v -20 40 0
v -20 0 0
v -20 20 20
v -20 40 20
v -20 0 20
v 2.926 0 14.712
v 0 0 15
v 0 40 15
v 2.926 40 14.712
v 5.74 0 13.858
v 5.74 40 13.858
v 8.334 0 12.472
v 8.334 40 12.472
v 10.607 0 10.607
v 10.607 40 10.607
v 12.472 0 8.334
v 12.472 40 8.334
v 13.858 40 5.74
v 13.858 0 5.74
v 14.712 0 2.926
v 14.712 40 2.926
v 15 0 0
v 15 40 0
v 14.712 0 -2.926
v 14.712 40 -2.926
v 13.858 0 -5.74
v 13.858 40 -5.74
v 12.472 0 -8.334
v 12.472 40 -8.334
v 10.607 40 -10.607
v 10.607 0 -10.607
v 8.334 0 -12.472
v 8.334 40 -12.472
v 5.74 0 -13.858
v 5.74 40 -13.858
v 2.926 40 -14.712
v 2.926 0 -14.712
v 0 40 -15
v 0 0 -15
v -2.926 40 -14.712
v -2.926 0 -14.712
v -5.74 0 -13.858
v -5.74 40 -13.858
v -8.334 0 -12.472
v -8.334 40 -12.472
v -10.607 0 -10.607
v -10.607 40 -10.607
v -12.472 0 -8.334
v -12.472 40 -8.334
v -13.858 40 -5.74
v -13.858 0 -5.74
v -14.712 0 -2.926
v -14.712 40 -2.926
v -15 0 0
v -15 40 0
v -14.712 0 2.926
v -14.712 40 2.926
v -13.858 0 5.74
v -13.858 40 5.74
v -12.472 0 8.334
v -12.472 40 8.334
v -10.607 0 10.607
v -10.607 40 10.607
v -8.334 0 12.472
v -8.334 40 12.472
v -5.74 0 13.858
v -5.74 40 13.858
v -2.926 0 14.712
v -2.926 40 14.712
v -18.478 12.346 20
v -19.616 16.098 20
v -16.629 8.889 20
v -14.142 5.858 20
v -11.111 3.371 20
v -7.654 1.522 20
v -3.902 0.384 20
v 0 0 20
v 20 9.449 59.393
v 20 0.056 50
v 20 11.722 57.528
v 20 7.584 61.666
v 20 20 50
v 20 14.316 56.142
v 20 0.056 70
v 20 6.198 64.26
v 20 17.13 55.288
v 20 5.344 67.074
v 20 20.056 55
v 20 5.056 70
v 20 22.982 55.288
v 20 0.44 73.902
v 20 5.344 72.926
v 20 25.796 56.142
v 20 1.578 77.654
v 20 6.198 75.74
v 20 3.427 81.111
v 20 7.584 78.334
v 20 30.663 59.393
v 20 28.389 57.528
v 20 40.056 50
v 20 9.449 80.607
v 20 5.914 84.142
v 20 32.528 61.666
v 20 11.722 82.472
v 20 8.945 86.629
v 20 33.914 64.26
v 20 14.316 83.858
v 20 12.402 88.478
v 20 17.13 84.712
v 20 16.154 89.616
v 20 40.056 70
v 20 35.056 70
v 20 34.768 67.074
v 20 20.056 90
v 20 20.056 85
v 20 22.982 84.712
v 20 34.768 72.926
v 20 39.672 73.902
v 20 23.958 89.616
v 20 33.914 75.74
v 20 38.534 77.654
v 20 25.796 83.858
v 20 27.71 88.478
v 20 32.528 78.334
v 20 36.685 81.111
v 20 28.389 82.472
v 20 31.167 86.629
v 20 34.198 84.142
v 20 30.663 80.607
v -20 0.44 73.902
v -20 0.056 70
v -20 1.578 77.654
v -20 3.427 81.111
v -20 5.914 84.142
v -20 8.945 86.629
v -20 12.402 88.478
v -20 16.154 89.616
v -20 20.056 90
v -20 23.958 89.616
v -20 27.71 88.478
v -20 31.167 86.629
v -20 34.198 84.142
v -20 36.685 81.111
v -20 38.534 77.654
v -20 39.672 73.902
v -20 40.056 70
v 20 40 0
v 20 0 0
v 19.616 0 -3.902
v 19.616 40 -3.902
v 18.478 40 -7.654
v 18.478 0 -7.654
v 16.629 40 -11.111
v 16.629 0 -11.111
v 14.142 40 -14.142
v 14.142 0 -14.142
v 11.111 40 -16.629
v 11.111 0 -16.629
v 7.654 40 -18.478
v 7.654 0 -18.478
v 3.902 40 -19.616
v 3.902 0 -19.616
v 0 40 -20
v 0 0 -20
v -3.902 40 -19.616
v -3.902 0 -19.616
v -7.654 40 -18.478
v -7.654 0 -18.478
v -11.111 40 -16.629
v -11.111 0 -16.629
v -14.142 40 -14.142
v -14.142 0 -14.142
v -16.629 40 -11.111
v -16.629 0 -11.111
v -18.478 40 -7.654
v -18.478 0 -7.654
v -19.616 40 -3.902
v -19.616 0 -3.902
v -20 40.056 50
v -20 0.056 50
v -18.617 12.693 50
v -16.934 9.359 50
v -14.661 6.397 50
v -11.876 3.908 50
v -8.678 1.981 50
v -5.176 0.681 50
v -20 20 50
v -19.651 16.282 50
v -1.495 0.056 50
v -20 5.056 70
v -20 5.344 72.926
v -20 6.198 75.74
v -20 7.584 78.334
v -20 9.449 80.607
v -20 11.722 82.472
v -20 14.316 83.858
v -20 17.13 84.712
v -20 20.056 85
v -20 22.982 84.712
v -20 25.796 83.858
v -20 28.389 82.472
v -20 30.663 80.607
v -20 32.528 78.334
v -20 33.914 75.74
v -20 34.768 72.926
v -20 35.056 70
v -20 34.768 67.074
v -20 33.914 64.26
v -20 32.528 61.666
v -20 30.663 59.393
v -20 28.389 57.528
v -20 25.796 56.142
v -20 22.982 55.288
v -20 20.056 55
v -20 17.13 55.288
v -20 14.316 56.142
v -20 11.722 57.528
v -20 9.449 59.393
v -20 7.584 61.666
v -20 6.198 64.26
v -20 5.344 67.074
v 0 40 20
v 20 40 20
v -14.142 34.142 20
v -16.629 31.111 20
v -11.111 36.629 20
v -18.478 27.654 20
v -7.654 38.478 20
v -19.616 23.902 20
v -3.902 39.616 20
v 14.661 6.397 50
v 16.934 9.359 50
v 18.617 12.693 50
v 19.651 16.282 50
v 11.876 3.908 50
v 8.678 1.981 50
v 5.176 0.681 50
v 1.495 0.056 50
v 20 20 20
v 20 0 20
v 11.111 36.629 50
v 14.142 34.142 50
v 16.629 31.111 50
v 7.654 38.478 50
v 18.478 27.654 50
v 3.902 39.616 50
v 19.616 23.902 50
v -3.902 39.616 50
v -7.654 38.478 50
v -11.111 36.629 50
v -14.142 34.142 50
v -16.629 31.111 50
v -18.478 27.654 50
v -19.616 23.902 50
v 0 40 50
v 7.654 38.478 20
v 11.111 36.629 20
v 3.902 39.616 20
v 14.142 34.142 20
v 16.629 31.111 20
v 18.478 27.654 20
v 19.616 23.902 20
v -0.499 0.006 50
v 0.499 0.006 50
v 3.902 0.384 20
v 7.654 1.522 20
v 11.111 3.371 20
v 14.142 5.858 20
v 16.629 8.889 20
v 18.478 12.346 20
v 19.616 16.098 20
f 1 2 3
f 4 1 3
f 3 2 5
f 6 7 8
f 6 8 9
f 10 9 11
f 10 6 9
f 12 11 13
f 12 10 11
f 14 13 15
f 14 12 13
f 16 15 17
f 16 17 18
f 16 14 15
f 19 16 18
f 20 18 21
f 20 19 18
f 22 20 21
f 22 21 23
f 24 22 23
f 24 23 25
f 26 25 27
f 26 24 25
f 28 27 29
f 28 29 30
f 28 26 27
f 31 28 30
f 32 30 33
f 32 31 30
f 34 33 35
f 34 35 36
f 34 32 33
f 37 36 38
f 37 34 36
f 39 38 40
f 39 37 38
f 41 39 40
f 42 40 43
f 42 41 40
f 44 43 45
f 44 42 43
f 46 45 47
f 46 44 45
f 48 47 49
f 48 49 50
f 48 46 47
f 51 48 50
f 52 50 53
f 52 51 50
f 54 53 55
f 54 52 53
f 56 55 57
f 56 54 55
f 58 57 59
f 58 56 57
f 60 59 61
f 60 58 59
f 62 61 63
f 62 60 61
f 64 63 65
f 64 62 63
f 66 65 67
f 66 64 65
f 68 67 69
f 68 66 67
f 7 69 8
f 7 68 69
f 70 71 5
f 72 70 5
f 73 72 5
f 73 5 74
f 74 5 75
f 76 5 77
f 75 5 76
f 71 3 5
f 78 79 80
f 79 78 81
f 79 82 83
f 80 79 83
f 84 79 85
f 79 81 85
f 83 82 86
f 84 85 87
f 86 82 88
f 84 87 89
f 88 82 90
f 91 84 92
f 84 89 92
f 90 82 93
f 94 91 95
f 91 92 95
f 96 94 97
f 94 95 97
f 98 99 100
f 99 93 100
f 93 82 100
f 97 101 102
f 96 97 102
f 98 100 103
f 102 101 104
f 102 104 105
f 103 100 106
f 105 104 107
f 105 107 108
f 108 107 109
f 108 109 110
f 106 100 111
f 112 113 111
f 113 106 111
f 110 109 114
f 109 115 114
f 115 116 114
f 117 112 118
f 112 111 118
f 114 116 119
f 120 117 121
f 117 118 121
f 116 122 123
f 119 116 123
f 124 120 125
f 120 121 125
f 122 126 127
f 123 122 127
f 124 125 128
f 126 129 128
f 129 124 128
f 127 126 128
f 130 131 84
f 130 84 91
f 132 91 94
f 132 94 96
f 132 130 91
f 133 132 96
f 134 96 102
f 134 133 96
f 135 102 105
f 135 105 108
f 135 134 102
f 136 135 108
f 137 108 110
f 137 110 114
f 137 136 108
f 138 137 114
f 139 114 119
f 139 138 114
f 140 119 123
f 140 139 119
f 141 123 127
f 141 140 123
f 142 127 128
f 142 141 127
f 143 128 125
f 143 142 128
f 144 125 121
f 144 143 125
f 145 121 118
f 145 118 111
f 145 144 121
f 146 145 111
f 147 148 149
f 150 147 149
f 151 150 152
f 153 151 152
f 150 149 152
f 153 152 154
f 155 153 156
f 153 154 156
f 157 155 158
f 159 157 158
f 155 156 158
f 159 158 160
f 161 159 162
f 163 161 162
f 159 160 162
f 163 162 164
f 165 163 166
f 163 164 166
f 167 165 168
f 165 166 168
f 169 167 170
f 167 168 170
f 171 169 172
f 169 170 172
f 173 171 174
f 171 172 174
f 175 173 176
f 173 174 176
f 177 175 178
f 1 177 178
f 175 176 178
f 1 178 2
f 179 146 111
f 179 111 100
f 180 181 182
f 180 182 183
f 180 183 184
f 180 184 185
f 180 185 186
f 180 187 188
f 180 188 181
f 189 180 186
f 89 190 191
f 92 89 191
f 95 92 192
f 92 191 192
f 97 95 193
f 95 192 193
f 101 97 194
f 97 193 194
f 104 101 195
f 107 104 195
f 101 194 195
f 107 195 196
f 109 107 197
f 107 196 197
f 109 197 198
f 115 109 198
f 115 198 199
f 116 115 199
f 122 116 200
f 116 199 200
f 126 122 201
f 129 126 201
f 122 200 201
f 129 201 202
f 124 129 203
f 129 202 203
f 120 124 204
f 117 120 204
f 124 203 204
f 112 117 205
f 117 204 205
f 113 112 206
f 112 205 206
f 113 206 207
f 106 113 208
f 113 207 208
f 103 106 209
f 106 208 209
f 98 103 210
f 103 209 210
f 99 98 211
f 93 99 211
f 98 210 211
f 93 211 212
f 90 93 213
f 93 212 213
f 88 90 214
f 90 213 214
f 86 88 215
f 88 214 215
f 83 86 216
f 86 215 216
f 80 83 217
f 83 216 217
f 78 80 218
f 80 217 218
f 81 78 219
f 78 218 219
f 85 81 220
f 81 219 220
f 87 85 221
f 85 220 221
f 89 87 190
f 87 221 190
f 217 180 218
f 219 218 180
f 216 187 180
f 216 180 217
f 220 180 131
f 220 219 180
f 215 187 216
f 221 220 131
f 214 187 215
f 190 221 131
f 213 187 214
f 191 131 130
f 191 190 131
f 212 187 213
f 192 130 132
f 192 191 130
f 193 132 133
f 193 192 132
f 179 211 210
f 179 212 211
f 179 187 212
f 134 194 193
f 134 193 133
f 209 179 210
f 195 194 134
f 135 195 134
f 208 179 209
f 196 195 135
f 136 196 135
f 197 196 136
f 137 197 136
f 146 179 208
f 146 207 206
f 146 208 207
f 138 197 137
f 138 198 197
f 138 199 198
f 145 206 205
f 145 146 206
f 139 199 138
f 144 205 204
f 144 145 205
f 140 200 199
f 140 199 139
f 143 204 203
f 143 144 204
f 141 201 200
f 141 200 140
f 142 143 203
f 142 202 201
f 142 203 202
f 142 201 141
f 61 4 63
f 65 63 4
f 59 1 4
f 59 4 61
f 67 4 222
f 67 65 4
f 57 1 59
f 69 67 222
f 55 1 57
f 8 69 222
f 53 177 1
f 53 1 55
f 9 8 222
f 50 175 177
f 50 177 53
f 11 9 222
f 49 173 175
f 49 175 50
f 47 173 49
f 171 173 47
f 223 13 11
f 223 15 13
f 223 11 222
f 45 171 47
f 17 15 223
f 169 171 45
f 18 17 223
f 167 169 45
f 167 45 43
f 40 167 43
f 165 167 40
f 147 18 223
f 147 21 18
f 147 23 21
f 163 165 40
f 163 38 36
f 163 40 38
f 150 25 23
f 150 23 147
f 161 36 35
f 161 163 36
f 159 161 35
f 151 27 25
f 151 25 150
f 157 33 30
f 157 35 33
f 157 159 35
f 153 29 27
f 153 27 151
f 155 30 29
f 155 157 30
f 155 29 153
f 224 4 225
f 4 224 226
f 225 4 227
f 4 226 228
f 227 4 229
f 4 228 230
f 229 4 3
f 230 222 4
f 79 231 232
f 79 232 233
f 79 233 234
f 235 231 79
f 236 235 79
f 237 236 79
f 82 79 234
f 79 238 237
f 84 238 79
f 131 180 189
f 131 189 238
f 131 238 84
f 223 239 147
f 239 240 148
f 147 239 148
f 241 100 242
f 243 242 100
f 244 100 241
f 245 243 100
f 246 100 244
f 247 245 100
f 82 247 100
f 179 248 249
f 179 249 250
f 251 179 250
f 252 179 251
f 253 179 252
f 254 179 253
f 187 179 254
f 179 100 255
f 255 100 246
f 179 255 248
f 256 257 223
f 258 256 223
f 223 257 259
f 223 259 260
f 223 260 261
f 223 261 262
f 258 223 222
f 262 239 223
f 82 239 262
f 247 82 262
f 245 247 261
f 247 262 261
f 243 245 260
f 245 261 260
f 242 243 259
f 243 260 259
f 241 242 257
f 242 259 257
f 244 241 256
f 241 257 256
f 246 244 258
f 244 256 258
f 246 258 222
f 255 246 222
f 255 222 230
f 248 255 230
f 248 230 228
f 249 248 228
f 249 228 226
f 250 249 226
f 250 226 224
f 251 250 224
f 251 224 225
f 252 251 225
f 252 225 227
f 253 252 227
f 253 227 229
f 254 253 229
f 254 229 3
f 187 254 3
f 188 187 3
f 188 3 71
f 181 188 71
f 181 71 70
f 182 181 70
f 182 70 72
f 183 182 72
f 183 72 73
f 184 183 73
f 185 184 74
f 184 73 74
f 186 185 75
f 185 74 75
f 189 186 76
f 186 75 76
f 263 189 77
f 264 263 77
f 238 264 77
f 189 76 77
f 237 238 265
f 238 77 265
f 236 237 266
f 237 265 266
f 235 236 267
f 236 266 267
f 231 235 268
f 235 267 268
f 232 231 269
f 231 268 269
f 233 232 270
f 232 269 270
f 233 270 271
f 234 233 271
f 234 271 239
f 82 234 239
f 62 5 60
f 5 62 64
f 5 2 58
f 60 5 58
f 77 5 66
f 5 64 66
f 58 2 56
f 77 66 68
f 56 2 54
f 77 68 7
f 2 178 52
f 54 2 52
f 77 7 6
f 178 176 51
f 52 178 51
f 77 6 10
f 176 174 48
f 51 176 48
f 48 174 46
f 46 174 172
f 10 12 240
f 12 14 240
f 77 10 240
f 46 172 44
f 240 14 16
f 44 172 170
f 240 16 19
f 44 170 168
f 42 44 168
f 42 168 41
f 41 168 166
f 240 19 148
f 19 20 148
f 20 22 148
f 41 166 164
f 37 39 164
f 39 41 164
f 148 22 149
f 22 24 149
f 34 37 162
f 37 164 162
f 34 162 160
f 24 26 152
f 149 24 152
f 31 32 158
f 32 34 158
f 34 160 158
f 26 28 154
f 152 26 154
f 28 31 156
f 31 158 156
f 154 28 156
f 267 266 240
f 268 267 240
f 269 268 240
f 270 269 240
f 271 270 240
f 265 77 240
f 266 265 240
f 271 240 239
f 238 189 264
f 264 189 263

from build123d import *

# Parameters (mm, degrees)
SKETCH1_R           = 15
BOSS_EXTRUDE1_DEPTH = 40
BOSS_EXTRUDE2_START = 20
SKETCH2_R           = 20
BOSS_EXTRUDE2_DEPTH = 30
SKETCH3_R           = 15
BOSS_EXTRUDE3_DEPTH = 40


with BuildPart() as part:
    # Sketch1 → Boss-Extrude1 (new body)
    with BuildSketch(Plane(origin=(0, 0, 0), x_dir=(1, 0, 0), z_dir=(0, 1, 0))):
        with BuildLine():
            Line((-20, -20), (20, -20))
            Line((20, -20), (20, 0))
            ThreePointArc((20, 0), (0, 20), (-20, 0))
            Line((-20, 0), (-20, -20))
        make_face()
        with Locations(Location((0, 0, 0), (0, 0, 270))):
            Circle(SKETCH1_R, mode=Mode.SUBTRACT)
    extrude(amount=BOSS_EXTRUDE1_DEPTH)

    # Sketch2 → Boss-Extrude2 (add)
    with BuildSketch(Plane.XY.offset(BOSS_EXTRUDE2_START)):
        with Locations((0, 20)):
            Circle(SKETCH2_R)
    extrude(amount=BOSS_EXTRUDE2_DEPTH)

    # Sketch3 → Boss-Extrude3 (add)
    with BuildSketch(Plane.ZY.offset(20)):
        with BuildLine():
            Line((50, 40.055924185), (50, 0.055924185))
            Line((50, 0.055924185), (70, 0.055924185))
            ThreePointArc((70, 0.055924185), (90, 20.055924185), (70, 40.055924185))
            Line((70, 40.055924185), (50, 40.055924185))
        make_face()
        with Locations(Location((70, 20.055924185, 0), (0, 0, 270))):
            Circle(SKETCH3_R, mode=Mode.SUBTRACT)
    extrude(amount=-BOSS_EXTRUDE3_DEPTH)


solid = part.part
